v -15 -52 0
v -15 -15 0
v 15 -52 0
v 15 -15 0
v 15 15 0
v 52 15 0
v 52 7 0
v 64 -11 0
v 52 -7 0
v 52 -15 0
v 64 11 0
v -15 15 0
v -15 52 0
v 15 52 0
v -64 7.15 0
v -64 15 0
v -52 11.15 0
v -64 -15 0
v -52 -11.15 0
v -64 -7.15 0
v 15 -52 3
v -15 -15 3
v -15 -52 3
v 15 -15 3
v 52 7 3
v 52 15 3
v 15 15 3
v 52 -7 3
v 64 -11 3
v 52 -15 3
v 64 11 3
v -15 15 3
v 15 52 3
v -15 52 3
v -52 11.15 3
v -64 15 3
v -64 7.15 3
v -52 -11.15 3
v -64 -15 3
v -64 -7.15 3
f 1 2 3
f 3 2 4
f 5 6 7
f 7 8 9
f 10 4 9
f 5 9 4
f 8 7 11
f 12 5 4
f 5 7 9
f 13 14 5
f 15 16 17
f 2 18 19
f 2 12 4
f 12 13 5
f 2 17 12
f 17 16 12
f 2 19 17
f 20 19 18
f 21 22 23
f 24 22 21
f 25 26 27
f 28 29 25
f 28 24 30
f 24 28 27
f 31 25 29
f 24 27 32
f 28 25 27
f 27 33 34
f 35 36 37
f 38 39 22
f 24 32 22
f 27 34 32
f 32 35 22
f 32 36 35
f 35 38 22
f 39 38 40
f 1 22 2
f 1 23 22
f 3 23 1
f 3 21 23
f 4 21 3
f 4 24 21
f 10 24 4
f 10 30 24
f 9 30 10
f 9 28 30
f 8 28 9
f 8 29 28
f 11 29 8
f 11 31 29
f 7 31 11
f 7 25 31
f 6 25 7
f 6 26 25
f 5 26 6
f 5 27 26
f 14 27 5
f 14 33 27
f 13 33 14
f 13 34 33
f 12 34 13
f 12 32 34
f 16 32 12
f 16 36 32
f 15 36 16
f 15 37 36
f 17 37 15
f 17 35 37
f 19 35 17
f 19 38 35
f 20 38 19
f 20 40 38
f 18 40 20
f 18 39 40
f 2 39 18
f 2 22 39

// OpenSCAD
// "Plus"-shaped claw that drops onto a Mac mini M4 (127x127x50mm).
// The plug and socket variants have four fingers wrapping ~15mm down
// each side of the Mac. The pass-through variant skips the fingers and
// pulls its dovetails inward — it latches on top of the Mac and relies
// on its plug/socket neighbours to constrain the cross-stack axis.
// This shrinks the gap between Macs from ~19mm to ~4mm per joint.
//
// Variants (see mini_claw_dovetail.json):
//   pass-through — tongue on +X, socket on -X. No fingers. Must sit
//                  between a plug and a socket (or another pass-through
//                  with at least one finger'd neighbour upstream).
//   plug         — tongue only, with fingers. Use at the chain's -X end.
//   socket       — socket only, with fingers. Use at the chain's +X end.
//
// Two prints chain end-to-end by dropping the second print straight
// down — its socket envelops the first print's tongue as it descends.
// The top face is completely flat (no upward protrusions). Print with
// the plate top on the bed and the fingers pointing up.

$fa = 2;
$fs = 0.5;

// === Variant ===
mode = "pass-through"; // [pass-through, plug, socket]

has_tongue  = (mode == "pass-through") || (mode == "plug");
has_socket  = (mode == "pass-through") || (mode == "socket");
has_fingers = (mode != "pass-through");

// === Mac mini M4 ===
mini_w = 127;

// === Claw ===
arm_width        = 30;
plate_thickness  = 3;
finger_height    = 15;
finger_thickness = 3;
side_clearance   = 0.5;

inner_span   = mini_w + 2 * side_clearance;
outer_span   = inner_span + 2 * finger_thickness;
finger_inner = inner_span / 2;
finger_outer = outer_span / 2;

// Where the dovetail attaches to the plate (and how far the plus arm
// extends). Plug/socket use the finger position; pass-through pulls
// in so the neighbour's finger still clears this Mac by side_clearance.
//   neighbour_finger_outer (in world) = -pt_arm_half - dovetail_length + finger_thickness
//   set ≤ -mini_w/2 - side_clearance  →  pt_arm_half ≥ 52
pt_arm_half = 52;
arm_half    = has_fingers ? finger_outer : pt_arm_half;

// === Dovetail ===
dovetail_length = 12;
dovetail_narrow = 14;
dovetail_wide   = 22;
fit_gap         = 0.3;

// 2D outline (top view) of the plate, plus the optional +X tongue and the
// optional -X socket-host extension with cavity subtracted. Linear-extruding
// this once gives both the flat top and the through-hole.
module claw_outline_2d() {
    difference() {
        union() {
            square([2*arm_half, arm_width], center = true);
            square([arm_width, 2*arm_half], center = true);
            if (has_tongue)
                // narrow at the attached base, widens out to the tip
                translate([arm_half, 0])
                    polygon([
                        [0,               -dovetail_narrow/2],
                        [0,                dovetail_narrow/2],
                        [dovetail_length,  dovetail_wide/2],
                        [dovetail_length, -dovetail_wide/2],
                    ]);
            if (has_socket)
                // arm-width slab extending past the -X arm; cavity cut below
                translate([-arm_half - dovetail_length, -arm_width/2])
                    square([dovetail_length, arm_width]);
        }
        if (has_socket)
            // Cavity mirrors the tongue trapezoid + fit_gap. Wide edge faces
            // the gap to capture the neighbor's wide tongue tip; narrows
            // toward the outer end of the extension.
            translate([-arm_half, 0])
                polygon([
                    [0,                -(dovetail_wide   + fit_gap)/2],
                    [0,                 (dovetail_wide   + fit_gap)/2],
                    [-dovetail_length,  (dovetail_narrow + fit_gap)/2],
                    [-dovetail_length, -(dovetail_narrow + fit_gap)/2],
                ]);
    }
}

module finger(cx, cy, sx, sy) {
    translate([cx, cy, -finger_height])
        cube([sx, sy, finger_height + plate_thickness]);
}

union() {
    linear_extrude(plate_thickness)
        claw_outline_2d();
    if (has_fingers) {
        finger( finger_inner,  -arm_width/2,   finger_thickness, arm_width);
        finger(-finger_outer,  -arm_width/2,   finger_thickness, arm_width);
        finger(-arm_width/2,    finger_inner,  arm_width,        finger_thickness);
        finger(-arm_width/2,   -finger_outer,  arm_width,        finger_thickness);
    }
}
